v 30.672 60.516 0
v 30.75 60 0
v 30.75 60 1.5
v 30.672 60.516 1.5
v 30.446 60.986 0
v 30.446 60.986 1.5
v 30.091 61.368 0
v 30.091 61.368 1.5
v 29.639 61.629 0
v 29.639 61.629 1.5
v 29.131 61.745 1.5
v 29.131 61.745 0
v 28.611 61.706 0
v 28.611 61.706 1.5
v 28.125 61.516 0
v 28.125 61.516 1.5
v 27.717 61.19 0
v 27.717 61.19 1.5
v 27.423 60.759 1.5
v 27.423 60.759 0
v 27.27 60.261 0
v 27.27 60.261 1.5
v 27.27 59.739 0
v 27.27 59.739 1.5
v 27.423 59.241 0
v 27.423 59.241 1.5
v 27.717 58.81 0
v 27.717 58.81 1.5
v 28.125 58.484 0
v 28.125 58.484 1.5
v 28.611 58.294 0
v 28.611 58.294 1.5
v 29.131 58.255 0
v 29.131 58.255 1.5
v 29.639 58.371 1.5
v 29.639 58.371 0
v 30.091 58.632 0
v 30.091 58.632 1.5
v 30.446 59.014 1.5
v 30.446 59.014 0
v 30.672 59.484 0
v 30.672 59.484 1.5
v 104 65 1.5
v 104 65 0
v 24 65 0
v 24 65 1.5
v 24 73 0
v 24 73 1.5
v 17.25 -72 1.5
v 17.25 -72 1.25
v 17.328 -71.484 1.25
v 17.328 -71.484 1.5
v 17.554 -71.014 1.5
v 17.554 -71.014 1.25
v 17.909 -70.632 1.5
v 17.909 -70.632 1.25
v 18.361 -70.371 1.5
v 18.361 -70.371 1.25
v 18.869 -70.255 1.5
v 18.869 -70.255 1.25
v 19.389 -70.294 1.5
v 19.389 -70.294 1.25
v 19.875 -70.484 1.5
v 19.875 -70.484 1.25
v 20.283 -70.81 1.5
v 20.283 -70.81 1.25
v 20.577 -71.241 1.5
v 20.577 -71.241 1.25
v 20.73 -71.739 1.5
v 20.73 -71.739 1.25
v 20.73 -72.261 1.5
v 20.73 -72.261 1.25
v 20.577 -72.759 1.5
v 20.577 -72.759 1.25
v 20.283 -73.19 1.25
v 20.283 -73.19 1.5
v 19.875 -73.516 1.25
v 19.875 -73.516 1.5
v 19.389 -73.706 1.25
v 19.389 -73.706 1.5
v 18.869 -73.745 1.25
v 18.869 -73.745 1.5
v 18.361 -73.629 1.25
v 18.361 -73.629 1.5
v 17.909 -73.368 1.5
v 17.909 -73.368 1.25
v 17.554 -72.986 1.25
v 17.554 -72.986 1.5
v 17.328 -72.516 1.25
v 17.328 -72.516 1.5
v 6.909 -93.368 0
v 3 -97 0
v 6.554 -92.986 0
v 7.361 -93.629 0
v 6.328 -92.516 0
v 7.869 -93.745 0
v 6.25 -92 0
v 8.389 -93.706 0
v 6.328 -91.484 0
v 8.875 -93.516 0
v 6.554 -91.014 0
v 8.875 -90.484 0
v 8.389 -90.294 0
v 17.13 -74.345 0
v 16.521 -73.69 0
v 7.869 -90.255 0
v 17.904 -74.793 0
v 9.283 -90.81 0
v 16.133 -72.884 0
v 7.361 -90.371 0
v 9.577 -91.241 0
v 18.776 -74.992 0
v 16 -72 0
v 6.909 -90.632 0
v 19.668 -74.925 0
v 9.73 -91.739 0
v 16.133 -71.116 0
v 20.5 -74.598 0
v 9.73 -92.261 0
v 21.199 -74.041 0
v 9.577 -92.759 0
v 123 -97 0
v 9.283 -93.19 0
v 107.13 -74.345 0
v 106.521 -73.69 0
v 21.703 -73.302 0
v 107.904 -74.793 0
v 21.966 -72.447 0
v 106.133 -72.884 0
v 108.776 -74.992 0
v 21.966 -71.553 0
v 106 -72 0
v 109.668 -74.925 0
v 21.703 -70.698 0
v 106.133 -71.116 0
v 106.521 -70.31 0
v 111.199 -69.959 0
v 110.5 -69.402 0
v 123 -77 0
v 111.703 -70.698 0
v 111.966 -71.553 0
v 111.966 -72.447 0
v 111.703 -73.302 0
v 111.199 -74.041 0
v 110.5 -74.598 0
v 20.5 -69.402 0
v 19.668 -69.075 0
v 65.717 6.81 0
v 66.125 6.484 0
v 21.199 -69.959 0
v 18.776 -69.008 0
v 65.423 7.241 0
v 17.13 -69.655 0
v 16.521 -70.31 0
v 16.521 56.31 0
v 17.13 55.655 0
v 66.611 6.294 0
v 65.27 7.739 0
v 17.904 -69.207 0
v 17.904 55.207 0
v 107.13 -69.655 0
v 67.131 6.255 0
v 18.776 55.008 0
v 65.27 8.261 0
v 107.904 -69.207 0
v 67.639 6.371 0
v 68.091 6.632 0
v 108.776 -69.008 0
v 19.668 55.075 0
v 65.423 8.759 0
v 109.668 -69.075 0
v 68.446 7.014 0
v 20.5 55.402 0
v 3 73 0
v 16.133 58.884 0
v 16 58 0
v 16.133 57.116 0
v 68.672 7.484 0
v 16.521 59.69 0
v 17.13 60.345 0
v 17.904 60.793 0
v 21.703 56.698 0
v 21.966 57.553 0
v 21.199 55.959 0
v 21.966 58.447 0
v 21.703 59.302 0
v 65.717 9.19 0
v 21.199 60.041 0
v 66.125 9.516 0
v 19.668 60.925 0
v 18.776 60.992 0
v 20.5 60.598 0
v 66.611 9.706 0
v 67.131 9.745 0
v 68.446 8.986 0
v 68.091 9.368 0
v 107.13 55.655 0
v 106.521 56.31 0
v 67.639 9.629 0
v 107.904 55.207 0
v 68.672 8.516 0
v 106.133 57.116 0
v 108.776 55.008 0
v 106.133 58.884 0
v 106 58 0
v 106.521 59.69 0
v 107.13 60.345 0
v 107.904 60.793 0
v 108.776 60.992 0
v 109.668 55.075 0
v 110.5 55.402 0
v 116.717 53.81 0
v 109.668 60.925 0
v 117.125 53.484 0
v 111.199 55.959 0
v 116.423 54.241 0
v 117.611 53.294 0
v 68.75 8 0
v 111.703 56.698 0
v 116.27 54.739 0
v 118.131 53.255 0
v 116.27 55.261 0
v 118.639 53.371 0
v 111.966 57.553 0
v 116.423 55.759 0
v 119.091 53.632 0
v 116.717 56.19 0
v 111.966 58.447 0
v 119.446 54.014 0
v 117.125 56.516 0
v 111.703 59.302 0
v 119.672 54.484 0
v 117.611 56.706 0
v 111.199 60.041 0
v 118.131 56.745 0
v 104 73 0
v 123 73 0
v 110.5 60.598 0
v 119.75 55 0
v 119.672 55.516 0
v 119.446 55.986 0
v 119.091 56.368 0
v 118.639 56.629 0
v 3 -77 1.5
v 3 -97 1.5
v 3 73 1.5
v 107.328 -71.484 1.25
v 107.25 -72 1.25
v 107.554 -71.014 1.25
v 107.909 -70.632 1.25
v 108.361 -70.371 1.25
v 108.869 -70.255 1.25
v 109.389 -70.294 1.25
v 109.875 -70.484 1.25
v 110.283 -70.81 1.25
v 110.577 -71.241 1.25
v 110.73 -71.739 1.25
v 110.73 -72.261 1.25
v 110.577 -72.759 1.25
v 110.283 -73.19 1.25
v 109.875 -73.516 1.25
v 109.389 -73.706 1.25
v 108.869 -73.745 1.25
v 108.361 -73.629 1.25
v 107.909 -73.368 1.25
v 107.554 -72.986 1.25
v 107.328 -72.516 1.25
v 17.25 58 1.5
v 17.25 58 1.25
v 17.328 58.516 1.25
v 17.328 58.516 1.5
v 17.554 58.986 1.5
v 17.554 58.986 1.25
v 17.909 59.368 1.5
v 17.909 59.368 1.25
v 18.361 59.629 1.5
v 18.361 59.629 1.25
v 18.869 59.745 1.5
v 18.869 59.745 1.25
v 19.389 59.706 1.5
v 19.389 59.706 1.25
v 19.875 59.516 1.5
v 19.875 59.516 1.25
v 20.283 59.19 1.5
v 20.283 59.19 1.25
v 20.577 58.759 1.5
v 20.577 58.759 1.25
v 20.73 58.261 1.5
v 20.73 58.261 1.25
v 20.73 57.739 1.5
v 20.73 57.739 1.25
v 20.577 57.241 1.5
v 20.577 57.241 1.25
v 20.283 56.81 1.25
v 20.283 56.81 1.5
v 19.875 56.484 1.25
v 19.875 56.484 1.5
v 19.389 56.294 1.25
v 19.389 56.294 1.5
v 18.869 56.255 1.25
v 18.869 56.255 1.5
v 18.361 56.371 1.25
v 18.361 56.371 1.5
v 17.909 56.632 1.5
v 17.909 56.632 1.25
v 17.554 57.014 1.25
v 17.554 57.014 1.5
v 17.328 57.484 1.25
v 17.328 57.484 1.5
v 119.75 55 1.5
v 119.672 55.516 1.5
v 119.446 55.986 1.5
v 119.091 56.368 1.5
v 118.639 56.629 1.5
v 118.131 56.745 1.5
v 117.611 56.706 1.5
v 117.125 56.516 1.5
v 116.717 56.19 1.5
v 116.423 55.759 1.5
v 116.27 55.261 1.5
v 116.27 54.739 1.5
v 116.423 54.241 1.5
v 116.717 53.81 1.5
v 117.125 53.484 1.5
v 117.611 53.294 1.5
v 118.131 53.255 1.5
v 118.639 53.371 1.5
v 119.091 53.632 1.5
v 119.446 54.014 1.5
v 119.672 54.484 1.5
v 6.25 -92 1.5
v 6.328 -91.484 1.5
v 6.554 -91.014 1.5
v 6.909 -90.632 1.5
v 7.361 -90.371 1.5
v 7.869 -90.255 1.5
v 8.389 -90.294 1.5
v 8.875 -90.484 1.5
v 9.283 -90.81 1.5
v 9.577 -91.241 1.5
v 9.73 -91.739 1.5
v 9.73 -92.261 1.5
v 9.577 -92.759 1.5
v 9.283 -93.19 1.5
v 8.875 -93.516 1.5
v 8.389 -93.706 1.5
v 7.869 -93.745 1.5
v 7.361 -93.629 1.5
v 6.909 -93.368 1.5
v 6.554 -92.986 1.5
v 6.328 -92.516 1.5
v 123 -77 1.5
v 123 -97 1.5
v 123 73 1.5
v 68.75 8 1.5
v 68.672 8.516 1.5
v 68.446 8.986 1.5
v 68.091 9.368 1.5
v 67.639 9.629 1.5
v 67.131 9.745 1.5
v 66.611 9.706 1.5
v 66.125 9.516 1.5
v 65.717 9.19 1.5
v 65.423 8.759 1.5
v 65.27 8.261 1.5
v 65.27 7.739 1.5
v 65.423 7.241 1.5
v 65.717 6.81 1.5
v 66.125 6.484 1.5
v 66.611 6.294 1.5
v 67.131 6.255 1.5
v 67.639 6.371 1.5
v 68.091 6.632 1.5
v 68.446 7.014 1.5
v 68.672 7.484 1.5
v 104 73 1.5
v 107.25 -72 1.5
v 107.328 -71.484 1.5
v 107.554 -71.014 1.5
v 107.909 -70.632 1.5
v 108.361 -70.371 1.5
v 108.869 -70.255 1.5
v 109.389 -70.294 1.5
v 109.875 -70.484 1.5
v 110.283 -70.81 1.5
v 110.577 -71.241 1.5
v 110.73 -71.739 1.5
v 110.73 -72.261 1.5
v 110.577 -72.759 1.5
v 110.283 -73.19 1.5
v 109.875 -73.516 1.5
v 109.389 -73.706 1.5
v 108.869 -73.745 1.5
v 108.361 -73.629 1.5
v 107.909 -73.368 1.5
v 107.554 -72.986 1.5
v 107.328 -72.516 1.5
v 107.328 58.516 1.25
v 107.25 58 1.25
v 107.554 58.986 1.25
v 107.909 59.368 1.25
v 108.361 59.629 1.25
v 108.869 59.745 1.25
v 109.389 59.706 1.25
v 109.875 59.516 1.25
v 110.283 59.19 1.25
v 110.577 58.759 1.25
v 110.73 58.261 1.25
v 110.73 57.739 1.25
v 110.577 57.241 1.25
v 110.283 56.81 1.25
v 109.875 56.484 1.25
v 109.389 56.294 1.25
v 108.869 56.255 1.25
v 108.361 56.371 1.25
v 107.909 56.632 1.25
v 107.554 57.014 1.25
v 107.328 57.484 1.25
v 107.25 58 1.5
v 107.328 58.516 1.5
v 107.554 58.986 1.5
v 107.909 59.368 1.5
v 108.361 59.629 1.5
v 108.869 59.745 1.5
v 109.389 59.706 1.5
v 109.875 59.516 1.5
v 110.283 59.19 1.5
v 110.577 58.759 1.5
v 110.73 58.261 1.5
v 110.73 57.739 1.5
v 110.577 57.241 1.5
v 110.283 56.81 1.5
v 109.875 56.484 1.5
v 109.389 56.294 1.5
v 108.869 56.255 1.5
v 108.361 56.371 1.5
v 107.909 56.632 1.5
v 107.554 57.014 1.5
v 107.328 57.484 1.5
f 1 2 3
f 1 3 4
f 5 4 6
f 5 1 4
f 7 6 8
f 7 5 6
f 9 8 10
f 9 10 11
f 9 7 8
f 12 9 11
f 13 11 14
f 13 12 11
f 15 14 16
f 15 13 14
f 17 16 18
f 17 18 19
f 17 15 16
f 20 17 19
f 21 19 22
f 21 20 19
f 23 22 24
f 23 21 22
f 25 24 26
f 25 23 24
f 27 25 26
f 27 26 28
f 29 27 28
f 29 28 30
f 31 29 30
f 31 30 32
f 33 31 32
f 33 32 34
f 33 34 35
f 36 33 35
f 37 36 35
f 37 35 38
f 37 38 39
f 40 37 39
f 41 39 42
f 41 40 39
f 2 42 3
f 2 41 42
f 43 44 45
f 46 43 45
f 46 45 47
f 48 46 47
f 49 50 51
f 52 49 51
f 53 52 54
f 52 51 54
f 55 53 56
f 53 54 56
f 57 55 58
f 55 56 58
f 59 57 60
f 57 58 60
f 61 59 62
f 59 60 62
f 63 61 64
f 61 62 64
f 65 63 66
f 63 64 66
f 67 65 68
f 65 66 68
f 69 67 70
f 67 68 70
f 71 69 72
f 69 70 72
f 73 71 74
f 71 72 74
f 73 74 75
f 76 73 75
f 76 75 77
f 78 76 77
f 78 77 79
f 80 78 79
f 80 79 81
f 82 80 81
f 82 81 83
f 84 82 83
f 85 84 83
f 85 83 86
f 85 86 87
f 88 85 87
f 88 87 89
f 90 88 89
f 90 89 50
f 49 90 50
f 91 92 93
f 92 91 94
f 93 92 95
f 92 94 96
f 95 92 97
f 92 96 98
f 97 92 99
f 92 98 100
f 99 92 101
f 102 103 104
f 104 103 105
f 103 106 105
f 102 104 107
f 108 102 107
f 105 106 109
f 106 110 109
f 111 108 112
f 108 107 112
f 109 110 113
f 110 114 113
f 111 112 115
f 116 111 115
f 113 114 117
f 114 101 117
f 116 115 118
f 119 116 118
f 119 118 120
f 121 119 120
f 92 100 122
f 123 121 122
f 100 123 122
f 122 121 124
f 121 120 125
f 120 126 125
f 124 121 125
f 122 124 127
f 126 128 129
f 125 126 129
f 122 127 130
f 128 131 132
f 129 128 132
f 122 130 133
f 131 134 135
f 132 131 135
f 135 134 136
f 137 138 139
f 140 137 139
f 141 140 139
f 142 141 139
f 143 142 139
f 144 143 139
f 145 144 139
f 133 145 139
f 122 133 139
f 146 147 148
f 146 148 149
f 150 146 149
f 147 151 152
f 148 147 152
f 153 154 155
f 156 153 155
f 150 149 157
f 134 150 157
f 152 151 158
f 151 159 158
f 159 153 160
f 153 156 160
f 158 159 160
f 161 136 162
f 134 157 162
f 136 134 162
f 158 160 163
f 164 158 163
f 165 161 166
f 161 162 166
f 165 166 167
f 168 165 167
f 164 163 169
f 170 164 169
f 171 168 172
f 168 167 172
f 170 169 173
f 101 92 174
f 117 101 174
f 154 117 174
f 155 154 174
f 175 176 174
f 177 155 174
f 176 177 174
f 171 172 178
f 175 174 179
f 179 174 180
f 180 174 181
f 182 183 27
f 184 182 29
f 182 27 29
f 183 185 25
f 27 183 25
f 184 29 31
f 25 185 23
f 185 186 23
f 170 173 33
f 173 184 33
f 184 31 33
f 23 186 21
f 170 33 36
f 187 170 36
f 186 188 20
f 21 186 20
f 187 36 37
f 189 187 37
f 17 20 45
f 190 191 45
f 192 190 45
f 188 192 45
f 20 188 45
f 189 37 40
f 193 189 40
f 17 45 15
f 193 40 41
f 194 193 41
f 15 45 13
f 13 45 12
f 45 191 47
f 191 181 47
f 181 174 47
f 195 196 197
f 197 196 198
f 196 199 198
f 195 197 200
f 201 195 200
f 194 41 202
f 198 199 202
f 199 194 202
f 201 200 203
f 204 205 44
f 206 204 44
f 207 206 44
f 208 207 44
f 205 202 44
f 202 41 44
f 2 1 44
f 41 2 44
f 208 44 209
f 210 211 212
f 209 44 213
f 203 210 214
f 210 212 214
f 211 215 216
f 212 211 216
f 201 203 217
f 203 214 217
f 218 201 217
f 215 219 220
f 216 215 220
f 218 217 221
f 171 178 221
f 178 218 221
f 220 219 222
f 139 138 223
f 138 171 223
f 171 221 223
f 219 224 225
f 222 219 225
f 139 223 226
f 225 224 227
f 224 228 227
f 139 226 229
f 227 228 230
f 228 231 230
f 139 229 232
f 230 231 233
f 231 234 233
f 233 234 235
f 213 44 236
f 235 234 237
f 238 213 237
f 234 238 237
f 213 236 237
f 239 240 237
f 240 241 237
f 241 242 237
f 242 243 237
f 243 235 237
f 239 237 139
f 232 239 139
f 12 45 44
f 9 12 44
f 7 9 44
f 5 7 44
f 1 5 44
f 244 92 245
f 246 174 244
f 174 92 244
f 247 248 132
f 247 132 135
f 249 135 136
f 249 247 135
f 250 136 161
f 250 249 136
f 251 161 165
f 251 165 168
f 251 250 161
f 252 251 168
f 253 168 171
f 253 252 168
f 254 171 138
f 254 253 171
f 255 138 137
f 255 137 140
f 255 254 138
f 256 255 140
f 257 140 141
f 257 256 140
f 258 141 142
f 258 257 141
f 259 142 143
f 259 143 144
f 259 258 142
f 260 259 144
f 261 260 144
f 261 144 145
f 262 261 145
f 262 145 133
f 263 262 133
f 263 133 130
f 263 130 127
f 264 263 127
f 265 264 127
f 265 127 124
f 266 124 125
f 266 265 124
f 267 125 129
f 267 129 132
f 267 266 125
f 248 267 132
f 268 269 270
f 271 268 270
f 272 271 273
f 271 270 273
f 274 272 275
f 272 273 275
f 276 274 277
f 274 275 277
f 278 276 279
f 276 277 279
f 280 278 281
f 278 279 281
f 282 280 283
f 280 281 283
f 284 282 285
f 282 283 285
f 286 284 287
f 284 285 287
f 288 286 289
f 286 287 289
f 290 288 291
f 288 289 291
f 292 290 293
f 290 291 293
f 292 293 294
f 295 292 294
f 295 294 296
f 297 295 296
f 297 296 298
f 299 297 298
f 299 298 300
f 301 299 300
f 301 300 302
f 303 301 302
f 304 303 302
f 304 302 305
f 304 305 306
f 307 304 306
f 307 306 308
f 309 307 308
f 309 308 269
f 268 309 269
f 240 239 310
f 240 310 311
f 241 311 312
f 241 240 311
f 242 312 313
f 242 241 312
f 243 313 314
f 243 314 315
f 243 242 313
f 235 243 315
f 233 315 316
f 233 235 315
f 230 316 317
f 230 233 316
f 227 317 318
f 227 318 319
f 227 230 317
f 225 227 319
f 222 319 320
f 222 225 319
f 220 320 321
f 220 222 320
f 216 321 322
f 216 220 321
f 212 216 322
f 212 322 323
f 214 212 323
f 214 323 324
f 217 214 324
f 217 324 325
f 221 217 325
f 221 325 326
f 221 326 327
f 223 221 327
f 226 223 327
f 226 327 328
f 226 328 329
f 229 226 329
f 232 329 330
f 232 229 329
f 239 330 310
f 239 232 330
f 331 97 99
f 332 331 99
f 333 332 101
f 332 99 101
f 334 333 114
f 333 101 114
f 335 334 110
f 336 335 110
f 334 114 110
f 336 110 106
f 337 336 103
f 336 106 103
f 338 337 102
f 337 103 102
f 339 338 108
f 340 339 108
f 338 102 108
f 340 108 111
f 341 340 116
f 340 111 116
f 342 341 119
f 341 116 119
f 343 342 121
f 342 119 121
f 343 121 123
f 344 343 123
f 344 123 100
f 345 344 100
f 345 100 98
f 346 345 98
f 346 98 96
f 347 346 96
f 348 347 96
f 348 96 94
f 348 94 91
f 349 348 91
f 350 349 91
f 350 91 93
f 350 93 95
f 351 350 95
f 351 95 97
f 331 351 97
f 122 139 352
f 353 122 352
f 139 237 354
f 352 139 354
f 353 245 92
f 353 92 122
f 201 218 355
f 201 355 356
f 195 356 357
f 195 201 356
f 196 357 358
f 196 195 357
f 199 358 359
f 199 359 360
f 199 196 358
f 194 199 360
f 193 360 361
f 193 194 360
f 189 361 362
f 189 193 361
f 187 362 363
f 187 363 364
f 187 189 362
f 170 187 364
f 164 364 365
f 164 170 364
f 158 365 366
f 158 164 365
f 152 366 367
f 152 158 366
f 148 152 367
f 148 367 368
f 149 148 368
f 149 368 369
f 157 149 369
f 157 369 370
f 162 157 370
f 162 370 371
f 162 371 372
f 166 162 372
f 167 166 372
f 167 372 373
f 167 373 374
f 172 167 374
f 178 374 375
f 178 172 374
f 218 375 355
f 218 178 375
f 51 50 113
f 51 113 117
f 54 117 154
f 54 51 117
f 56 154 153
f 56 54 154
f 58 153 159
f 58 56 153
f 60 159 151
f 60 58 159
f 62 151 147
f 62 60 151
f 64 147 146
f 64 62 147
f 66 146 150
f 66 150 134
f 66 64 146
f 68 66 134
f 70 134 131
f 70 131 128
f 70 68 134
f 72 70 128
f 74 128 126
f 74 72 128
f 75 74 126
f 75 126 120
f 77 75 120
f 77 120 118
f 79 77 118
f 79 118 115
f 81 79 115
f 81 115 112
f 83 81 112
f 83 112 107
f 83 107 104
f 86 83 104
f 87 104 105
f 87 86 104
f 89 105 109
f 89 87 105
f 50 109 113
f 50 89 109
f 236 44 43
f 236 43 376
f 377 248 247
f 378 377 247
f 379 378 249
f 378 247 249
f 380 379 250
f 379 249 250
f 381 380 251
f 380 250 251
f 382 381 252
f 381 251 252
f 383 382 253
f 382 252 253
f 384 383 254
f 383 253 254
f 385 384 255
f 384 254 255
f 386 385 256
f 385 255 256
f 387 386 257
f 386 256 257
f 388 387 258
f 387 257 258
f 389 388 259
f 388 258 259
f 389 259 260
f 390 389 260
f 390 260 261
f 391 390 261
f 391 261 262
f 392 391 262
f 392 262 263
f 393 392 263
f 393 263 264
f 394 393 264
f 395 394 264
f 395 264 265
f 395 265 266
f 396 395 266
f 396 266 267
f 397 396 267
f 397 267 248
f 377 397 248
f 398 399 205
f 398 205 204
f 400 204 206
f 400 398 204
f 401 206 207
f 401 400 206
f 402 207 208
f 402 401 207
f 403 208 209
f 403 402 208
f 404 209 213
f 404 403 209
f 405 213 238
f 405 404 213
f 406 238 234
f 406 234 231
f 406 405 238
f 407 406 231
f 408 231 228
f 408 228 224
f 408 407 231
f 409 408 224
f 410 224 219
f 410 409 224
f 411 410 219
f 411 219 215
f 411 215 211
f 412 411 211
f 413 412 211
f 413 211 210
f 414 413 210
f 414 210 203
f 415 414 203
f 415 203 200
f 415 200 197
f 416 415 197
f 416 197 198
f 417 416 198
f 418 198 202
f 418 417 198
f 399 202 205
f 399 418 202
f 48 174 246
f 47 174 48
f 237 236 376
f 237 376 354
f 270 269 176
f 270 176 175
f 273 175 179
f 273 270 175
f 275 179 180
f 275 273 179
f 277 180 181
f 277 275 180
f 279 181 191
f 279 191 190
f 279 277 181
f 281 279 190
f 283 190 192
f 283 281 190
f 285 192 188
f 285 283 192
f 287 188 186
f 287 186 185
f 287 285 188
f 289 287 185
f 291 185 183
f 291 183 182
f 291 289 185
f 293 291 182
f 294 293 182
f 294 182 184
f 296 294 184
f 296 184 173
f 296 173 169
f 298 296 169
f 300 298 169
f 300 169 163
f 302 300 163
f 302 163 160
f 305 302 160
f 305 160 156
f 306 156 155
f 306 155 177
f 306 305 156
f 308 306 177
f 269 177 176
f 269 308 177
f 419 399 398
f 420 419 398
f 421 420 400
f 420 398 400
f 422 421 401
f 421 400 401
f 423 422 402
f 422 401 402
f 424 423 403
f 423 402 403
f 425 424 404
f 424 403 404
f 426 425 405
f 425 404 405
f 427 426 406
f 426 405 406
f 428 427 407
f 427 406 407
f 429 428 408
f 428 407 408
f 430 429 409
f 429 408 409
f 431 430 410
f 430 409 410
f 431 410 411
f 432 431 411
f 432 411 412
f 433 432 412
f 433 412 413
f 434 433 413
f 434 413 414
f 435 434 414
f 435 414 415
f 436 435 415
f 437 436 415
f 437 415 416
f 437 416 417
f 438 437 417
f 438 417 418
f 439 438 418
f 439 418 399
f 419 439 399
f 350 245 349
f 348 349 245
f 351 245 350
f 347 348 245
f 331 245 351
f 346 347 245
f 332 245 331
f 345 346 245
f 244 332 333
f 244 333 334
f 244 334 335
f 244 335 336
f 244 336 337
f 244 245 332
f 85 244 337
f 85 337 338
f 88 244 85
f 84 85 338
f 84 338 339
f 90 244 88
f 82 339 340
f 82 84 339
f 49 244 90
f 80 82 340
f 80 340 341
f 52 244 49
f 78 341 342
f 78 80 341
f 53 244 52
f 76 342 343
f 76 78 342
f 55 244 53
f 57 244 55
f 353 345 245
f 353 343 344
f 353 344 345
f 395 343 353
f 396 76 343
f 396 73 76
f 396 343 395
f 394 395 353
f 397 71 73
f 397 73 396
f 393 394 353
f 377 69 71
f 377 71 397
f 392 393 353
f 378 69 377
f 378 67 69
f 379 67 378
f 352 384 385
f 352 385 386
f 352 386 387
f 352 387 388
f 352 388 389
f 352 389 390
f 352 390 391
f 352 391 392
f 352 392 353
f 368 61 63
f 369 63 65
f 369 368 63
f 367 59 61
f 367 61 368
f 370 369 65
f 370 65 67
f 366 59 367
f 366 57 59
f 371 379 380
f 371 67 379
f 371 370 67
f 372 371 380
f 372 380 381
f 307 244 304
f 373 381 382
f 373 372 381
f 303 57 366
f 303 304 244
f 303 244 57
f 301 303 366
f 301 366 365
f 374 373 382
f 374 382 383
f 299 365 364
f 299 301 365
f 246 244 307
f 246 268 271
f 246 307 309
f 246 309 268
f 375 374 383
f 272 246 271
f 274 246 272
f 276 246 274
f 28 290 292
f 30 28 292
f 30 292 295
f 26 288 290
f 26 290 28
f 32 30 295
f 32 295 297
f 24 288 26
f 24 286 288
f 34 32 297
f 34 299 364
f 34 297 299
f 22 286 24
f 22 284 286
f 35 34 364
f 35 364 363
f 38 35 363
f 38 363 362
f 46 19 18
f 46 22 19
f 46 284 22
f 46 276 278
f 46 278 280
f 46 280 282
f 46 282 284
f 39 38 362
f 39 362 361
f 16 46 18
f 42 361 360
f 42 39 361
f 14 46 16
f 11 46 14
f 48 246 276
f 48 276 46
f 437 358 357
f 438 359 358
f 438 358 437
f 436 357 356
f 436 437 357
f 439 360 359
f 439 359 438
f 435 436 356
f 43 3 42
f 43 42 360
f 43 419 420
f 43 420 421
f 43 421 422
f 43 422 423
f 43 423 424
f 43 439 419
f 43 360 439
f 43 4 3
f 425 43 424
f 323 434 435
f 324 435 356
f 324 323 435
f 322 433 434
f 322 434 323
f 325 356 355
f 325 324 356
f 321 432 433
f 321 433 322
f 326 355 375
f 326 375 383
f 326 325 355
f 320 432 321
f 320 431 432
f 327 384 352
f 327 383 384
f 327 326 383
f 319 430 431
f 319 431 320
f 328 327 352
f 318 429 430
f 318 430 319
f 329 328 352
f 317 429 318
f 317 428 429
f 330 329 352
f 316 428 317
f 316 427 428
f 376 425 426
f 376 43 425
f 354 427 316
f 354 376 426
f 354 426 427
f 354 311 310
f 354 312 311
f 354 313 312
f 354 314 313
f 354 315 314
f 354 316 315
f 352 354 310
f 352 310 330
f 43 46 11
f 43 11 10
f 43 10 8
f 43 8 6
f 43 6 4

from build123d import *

# Parameters (mm, degrees)
SKETCH_1_W          = 135
SKETCH_1_H          = 73
SKETCH_1_R          = 1.75
EXTRUDE_1_DEPTH     = 1.5
EXTRUDE_2_DEPTH     = 1.5
SKETCH_3_R          = 1.75
CUT_EXTRUDE_1_DEPTH = 10
SKETCH_4_W          = 41.774979177
SKETCH_4_H          = 174.552922684
SKETCH_4_W_2        = 25.198535703
SKETCH_4_H_2        = 178.613265212
SKETCH_4_W_3        = 80
SKETCH_4_H_3        = 12.9239929
CUT_EXTRUDE_2_DEPTH = 10
SKETCH_5_W          = 120
SKETCH_5_H          = 1.5
EXTRUDE_3_DEPTH     = 20
SKETCH_6_R          = 1.75
CUT_EXTRUDE_3_DEPTH = 20
CHAMFER_1_SIZE      = 1.25


with BuildPart() as part:
    # Эскиз1 → Вытянуть1 (new body)
    with BuildSketch(Plane.XY):
        with Locations((67.5, 36.5)):
            Rectangle(SKETCH_1_W, SKETCH_1_H)
        with Locations((118, 55)):
            Circle(SKETCH_1_R, mode=Mode.SUBTRACT)
        with Locations((29, 60)):
            Circle(SKETCH_1_R, mode=Mode.SUBTRACT)
        with Locations((67, 8)):
            Circle(SKETCH_1_R, mode=Mode.SUBTRACT)
    extrude(amount=EXTRUDE_1_DEPTH)

    # Эскиз2 → Вытянуть2 (add)
    with BuildSketch(Plane(origin=(0, 0, 0), x_dir=(-1, 0, 0), z_dir=(0, 0, -1))):
        Polygon((-135, 0), (-135, 73), (-137.5, 73), (-137.5, -77), (12.5, -77), (12.5, 73), (0, 73), (0, 0), align=None)
    extrude(amount=-EXTRUDE_2_DEPTH)

    # Эскиз3 → Вырез-Вытянуть1 (cut)
    with BuildSketch(Plane(origin=(0, 0, 0), x_dir=(-1, 0, 0), z_dir=(0, 0, -1))):
        with Locations((-109, 58)):
            Circle(SKETCH_3_R)
        with Locations((-109, -72)):
            Circle(SKETCH_3_R)
        with Locations((-19, -72)):
            Circle(SKETCH_3_R)
        with Locations((-19, 58)):
            Circle(SKETCH_3_R)
    extrude(amount=-CUT_EXTRUDE_1_DEPTH, mode=Mode.SUBTRACT)

    # Эскиз4 → Вырез-Вытянуть2 (cut)
    with BuildSketch(Plane(origin=(0, 0, 0), x_dir=(-1, 0, 0), z_dir=(0, 0, -1))):
        with Locations((17.887489589, -5.455920086)):
            Rectangle(SKETCH_4_W, SKETCH_4_H)
        with Locations((-135.599267852, -7.48609135)):
            Rectangle(SKETCH_4_W_2, SKETCH_4_H_2)
        with Locations((-64, 71.46199645)):
            Rectangle(SKETCH_4_W_3, SKETCH_4_H_3)
    extrude(amount=-CUT_EXTRUDE_2_DEPTH, mode=Mode.SUBTRACT)

    # Эскиз5 → Вытянуть3 (add)
    with BuildSketch(Plane.XZ.offset(77)):
        with Locations((63, 0.75)):
            Rectangle(SKETCH_5_W, SKETCH_5_H)
    extrude(amount=EXTRUDE_3_DEPTH)

    # Эскиз6 → Вырез-Вытянуть3 (cut)
    with BuildSketch(Plane(origin=(0, 0, 0), x_dir=(-1, 0, 0), z_dir=(0, 0, -1))):
        with Locations((-8, -92)):
            Circle(SKETCH_6_R)
    extrude(amount=-CUT_EXTRUDE_3_DEPTH, mode=Mode.SUBTRACT)

    # Фаска1
    chamfer_1_edges = [part.edges().sort_by_distance(p)[0] for p in [
        (110.75, 58, 0),
        (110.75, -72, 0),
        (20.75, -72, 0),
        (20.75, 58, 0),
    ]]
    chamfer(chamfer_1_edges, length=CHAMFER_1_SIZE)


solid = part.part
